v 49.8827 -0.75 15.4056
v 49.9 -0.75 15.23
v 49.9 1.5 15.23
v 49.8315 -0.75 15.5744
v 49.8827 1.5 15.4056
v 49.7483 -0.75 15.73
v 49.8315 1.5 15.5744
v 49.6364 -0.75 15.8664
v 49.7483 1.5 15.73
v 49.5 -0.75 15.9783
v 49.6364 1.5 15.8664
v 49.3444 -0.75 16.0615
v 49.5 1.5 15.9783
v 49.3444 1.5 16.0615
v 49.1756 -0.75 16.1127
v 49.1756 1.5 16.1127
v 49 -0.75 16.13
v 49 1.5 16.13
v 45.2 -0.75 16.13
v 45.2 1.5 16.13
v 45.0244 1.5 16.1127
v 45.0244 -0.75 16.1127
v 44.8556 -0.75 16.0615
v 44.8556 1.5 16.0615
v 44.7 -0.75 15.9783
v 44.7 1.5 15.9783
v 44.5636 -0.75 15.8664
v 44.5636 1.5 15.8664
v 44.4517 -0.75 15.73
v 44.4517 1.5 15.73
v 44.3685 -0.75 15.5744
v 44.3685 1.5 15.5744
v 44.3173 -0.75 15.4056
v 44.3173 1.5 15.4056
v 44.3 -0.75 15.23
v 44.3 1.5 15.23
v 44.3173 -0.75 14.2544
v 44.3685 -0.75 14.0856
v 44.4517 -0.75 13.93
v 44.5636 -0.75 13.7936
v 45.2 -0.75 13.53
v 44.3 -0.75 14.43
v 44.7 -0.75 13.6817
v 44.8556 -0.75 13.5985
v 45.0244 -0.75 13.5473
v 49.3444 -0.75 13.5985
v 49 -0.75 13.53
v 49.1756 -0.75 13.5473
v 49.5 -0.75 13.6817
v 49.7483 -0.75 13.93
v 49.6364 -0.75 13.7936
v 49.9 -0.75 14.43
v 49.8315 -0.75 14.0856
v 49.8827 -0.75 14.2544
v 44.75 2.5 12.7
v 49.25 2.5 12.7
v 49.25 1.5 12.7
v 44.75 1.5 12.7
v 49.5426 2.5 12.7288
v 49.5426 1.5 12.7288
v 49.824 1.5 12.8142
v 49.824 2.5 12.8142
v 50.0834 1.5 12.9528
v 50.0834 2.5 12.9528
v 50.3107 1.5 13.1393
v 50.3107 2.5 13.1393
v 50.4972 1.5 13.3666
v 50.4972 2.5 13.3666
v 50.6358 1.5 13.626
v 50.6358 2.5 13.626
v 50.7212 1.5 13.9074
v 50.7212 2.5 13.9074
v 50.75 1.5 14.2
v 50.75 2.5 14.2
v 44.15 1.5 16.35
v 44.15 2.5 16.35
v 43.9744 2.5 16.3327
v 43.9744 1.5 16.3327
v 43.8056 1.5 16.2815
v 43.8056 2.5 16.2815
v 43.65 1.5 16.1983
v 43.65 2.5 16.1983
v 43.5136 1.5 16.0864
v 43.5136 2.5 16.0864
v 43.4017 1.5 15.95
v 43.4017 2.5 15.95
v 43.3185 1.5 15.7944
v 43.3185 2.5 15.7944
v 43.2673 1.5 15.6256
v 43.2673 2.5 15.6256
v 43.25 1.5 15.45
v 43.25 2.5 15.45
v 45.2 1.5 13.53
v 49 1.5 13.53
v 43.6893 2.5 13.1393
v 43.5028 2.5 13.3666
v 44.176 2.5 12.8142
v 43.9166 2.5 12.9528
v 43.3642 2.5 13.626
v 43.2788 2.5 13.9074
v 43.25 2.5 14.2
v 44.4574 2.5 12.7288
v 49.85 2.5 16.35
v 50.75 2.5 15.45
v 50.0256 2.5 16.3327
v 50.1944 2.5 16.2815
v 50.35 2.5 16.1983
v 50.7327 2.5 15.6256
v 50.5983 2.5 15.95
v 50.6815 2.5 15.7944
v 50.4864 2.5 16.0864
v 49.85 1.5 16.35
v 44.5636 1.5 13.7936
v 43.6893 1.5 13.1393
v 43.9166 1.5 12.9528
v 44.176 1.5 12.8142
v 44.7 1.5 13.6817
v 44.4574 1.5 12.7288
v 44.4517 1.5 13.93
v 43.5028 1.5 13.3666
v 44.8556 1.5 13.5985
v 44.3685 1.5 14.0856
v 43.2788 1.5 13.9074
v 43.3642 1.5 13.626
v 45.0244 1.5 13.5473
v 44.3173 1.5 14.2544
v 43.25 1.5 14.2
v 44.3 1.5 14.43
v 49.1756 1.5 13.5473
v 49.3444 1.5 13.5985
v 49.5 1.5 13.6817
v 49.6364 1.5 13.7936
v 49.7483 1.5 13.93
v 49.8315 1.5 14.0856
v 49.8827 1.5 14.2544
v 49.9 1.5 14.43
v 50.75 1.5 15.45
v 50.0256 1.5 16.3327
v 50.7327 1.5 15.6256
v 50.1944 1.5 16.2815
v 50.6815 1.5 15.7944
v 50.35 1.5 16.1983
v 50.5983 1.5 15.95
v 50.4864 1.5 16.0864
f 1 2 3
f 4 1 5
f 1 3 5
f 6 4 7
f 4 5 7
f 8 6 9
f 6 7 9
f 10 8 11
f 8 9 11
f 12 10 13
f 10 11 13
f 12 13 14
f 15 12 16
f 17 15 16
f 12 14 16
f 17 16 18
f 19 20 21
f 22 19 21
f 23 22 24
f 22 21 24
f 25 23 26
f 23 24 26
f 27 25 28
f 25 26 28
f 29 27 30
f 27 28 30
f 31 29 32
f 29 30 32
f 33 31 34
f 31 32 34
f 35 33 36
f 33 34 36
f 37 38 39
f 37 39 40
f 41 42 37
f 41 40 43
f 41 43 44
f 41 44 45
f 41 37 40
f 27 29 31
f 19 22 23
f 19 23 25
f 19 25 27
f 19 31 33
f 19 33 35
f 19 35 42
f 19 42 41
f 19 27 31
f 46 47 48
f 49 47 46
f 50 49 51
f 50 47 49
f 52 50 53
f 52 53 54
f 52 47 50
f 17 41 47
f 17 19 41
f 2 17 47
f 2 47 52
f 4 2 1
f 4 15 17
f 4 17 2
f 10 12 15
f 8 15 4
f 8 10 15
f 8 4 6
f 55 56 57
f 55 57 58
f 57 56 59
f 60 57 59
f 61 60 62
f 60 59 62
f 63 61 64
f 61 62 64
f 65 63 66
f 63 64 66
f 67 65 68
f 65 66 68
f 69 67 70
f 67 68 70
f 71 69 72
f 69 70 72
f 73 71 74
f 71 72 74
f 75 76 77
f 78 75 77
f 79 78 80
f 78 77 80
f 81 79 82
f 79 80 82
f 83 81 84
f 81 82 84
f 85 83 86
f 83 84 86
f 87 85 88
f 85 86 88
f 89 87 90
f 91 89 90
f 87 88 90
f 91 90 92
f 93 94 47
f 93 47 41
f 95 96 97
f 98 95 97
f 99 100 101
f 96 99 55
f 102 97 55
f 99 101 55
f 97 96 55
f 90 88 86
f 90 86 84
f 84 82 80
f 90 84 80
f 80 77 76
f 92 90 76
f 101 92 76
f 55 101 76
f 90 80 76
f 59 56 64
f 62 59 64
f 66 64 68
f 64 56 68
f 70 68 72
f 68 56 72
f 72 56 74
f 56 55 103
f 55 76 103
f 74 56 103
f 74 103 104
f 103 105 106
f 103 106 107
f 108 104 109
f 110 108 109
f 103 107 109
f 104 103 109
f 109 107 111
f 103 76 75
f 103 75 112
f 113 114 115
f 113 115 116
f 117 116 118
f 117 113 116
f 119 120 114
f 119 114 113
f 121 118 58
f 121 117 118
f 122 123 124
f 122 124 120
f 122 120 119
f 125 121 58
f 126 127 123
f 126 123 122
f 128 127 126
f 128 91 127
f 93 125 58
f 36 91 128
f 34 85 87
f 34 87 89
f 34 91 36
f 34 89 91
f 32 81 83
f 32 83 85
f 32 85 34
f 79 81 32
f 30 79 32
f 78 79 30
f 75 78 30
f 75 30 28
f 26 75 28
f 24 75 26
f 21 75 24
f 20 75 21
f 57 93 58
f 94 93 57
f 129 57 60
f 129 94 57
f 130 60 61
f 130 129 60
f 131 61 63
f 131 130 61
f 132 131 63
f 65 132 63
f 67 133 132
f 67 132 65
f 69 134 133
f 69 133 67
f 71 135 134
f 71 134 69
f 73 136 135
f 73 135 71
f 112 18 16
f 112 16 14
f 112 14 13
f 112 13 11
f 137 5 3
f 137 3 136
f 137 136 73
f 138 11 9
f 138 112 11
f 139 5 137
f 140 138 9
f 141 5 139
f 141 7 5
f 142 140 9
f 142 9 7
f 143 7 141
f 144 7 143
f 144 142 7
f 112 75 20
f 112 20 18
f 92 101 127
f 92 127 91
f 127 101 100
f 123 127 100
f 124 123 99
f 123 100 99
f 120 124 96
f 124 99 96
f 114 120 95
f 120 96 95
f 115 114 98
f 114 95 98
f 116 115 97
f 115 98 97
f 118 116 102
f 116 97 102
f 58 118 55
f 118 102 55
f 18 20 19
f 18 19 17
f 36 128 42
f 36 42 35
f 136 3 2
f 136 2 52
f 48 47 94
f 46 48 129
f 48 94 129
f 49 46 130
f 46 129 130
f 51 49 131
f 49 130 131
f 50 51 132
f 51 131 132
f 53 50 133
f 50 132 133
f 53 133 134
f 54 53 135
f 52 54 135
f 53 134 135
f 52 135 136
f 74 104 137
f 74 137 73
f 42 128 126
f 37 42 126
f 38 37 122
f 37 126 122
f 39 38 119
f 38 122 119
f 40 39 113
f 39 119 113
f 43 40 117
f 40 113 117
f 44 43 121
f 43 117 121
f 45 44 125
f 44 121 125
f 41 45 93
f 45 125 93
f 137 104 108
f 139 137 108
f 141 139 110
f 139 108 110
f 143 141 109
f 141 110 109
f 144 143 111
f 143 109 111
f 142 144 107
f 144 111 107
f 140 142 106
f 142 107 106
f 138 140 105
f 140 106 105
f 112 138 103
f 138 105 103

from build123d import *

# Parameters (mm, degrees)
EXTRUDE031_DEPTH = 1
EXTRUDE030_DEPTH = 2.75


with BuildPart() as extrude031:
    # Sketch034 → Extrude031 (new body)
    with BuildSketch(Plane.XZ):
        with BuildLine():
            ThreePointArc((11.7, 16.35), (11.063604, 16.086396), (10.8, 15.45))
            Line((10.8, 14.2), (10.8, 15.45))
            ThreePointArc((10.8, 14.2), (11.23934, 13.13934), (12.3, 12.7))
            Line((16.8, 12.7), (12.3, 12.7))
            ThreePointArc((16.8, 12.7), (17.86066, 13.13934), (18.3, 14.2))
            Line((18.3, 15.45), (18.3, 14.2))
            ThreePointArc((18.3, 15.45), (18.036396, 16.086396), (17.4, 16.35))
            Line((11.7, 16.35), (17.4, 16.35))
        make_face()
    extrude(amount=EXTRUDE031_DEPTH)


with BuildPart() as extrude031_1:
    # Extrude031 placement: moved
    add(extrude031.part.moved(Location((0, 2.5, 0))))


with BuildPart() as button002:
    # Sketch033 → Extrude030 (new body)
    with BuildSketch(Plane.XZ):
        with BuildLine():
            ThreePointArc((12.75, 16.13), (12.113604, 15.866396), (11.85, 15.23))
            Line((11.85, 14.43), (11.85, 15.23))
            ThreePointArc((11.85, 14.43), (12.113604, 13.793604), (12.75, 13.53))
            Line((16.55, 13.53), (12.75, 13.53))
            ThreePointArc((16.55, 13.53), (17.186396, 13.793604), (17.45, 14.43))
            Line((17.45, 15.23), (17.45, 14.43))
            ThreePointArc((17.45, 15.23), (17.186396, 15.866396), (16.55, 16.13))
            Line((12.75, 16.13), (16.55, 16.13))
        make_face()
    extrude(amount=EXTRUDE030_DEPTH)


with BuildPart() as button002_1:
    # Extrude030 placement: moved
    add(button002.part.moved(Location((0, 2, 0))))

    # Fusion033: union Extrude031
    add(extrude031_1.part)


with BuildPart() as button002_2:
    # Fusion033 placement: moved
    add(button002_1.part.moved(Location((32.45, 0, 0))))


solid = button002_2.part
